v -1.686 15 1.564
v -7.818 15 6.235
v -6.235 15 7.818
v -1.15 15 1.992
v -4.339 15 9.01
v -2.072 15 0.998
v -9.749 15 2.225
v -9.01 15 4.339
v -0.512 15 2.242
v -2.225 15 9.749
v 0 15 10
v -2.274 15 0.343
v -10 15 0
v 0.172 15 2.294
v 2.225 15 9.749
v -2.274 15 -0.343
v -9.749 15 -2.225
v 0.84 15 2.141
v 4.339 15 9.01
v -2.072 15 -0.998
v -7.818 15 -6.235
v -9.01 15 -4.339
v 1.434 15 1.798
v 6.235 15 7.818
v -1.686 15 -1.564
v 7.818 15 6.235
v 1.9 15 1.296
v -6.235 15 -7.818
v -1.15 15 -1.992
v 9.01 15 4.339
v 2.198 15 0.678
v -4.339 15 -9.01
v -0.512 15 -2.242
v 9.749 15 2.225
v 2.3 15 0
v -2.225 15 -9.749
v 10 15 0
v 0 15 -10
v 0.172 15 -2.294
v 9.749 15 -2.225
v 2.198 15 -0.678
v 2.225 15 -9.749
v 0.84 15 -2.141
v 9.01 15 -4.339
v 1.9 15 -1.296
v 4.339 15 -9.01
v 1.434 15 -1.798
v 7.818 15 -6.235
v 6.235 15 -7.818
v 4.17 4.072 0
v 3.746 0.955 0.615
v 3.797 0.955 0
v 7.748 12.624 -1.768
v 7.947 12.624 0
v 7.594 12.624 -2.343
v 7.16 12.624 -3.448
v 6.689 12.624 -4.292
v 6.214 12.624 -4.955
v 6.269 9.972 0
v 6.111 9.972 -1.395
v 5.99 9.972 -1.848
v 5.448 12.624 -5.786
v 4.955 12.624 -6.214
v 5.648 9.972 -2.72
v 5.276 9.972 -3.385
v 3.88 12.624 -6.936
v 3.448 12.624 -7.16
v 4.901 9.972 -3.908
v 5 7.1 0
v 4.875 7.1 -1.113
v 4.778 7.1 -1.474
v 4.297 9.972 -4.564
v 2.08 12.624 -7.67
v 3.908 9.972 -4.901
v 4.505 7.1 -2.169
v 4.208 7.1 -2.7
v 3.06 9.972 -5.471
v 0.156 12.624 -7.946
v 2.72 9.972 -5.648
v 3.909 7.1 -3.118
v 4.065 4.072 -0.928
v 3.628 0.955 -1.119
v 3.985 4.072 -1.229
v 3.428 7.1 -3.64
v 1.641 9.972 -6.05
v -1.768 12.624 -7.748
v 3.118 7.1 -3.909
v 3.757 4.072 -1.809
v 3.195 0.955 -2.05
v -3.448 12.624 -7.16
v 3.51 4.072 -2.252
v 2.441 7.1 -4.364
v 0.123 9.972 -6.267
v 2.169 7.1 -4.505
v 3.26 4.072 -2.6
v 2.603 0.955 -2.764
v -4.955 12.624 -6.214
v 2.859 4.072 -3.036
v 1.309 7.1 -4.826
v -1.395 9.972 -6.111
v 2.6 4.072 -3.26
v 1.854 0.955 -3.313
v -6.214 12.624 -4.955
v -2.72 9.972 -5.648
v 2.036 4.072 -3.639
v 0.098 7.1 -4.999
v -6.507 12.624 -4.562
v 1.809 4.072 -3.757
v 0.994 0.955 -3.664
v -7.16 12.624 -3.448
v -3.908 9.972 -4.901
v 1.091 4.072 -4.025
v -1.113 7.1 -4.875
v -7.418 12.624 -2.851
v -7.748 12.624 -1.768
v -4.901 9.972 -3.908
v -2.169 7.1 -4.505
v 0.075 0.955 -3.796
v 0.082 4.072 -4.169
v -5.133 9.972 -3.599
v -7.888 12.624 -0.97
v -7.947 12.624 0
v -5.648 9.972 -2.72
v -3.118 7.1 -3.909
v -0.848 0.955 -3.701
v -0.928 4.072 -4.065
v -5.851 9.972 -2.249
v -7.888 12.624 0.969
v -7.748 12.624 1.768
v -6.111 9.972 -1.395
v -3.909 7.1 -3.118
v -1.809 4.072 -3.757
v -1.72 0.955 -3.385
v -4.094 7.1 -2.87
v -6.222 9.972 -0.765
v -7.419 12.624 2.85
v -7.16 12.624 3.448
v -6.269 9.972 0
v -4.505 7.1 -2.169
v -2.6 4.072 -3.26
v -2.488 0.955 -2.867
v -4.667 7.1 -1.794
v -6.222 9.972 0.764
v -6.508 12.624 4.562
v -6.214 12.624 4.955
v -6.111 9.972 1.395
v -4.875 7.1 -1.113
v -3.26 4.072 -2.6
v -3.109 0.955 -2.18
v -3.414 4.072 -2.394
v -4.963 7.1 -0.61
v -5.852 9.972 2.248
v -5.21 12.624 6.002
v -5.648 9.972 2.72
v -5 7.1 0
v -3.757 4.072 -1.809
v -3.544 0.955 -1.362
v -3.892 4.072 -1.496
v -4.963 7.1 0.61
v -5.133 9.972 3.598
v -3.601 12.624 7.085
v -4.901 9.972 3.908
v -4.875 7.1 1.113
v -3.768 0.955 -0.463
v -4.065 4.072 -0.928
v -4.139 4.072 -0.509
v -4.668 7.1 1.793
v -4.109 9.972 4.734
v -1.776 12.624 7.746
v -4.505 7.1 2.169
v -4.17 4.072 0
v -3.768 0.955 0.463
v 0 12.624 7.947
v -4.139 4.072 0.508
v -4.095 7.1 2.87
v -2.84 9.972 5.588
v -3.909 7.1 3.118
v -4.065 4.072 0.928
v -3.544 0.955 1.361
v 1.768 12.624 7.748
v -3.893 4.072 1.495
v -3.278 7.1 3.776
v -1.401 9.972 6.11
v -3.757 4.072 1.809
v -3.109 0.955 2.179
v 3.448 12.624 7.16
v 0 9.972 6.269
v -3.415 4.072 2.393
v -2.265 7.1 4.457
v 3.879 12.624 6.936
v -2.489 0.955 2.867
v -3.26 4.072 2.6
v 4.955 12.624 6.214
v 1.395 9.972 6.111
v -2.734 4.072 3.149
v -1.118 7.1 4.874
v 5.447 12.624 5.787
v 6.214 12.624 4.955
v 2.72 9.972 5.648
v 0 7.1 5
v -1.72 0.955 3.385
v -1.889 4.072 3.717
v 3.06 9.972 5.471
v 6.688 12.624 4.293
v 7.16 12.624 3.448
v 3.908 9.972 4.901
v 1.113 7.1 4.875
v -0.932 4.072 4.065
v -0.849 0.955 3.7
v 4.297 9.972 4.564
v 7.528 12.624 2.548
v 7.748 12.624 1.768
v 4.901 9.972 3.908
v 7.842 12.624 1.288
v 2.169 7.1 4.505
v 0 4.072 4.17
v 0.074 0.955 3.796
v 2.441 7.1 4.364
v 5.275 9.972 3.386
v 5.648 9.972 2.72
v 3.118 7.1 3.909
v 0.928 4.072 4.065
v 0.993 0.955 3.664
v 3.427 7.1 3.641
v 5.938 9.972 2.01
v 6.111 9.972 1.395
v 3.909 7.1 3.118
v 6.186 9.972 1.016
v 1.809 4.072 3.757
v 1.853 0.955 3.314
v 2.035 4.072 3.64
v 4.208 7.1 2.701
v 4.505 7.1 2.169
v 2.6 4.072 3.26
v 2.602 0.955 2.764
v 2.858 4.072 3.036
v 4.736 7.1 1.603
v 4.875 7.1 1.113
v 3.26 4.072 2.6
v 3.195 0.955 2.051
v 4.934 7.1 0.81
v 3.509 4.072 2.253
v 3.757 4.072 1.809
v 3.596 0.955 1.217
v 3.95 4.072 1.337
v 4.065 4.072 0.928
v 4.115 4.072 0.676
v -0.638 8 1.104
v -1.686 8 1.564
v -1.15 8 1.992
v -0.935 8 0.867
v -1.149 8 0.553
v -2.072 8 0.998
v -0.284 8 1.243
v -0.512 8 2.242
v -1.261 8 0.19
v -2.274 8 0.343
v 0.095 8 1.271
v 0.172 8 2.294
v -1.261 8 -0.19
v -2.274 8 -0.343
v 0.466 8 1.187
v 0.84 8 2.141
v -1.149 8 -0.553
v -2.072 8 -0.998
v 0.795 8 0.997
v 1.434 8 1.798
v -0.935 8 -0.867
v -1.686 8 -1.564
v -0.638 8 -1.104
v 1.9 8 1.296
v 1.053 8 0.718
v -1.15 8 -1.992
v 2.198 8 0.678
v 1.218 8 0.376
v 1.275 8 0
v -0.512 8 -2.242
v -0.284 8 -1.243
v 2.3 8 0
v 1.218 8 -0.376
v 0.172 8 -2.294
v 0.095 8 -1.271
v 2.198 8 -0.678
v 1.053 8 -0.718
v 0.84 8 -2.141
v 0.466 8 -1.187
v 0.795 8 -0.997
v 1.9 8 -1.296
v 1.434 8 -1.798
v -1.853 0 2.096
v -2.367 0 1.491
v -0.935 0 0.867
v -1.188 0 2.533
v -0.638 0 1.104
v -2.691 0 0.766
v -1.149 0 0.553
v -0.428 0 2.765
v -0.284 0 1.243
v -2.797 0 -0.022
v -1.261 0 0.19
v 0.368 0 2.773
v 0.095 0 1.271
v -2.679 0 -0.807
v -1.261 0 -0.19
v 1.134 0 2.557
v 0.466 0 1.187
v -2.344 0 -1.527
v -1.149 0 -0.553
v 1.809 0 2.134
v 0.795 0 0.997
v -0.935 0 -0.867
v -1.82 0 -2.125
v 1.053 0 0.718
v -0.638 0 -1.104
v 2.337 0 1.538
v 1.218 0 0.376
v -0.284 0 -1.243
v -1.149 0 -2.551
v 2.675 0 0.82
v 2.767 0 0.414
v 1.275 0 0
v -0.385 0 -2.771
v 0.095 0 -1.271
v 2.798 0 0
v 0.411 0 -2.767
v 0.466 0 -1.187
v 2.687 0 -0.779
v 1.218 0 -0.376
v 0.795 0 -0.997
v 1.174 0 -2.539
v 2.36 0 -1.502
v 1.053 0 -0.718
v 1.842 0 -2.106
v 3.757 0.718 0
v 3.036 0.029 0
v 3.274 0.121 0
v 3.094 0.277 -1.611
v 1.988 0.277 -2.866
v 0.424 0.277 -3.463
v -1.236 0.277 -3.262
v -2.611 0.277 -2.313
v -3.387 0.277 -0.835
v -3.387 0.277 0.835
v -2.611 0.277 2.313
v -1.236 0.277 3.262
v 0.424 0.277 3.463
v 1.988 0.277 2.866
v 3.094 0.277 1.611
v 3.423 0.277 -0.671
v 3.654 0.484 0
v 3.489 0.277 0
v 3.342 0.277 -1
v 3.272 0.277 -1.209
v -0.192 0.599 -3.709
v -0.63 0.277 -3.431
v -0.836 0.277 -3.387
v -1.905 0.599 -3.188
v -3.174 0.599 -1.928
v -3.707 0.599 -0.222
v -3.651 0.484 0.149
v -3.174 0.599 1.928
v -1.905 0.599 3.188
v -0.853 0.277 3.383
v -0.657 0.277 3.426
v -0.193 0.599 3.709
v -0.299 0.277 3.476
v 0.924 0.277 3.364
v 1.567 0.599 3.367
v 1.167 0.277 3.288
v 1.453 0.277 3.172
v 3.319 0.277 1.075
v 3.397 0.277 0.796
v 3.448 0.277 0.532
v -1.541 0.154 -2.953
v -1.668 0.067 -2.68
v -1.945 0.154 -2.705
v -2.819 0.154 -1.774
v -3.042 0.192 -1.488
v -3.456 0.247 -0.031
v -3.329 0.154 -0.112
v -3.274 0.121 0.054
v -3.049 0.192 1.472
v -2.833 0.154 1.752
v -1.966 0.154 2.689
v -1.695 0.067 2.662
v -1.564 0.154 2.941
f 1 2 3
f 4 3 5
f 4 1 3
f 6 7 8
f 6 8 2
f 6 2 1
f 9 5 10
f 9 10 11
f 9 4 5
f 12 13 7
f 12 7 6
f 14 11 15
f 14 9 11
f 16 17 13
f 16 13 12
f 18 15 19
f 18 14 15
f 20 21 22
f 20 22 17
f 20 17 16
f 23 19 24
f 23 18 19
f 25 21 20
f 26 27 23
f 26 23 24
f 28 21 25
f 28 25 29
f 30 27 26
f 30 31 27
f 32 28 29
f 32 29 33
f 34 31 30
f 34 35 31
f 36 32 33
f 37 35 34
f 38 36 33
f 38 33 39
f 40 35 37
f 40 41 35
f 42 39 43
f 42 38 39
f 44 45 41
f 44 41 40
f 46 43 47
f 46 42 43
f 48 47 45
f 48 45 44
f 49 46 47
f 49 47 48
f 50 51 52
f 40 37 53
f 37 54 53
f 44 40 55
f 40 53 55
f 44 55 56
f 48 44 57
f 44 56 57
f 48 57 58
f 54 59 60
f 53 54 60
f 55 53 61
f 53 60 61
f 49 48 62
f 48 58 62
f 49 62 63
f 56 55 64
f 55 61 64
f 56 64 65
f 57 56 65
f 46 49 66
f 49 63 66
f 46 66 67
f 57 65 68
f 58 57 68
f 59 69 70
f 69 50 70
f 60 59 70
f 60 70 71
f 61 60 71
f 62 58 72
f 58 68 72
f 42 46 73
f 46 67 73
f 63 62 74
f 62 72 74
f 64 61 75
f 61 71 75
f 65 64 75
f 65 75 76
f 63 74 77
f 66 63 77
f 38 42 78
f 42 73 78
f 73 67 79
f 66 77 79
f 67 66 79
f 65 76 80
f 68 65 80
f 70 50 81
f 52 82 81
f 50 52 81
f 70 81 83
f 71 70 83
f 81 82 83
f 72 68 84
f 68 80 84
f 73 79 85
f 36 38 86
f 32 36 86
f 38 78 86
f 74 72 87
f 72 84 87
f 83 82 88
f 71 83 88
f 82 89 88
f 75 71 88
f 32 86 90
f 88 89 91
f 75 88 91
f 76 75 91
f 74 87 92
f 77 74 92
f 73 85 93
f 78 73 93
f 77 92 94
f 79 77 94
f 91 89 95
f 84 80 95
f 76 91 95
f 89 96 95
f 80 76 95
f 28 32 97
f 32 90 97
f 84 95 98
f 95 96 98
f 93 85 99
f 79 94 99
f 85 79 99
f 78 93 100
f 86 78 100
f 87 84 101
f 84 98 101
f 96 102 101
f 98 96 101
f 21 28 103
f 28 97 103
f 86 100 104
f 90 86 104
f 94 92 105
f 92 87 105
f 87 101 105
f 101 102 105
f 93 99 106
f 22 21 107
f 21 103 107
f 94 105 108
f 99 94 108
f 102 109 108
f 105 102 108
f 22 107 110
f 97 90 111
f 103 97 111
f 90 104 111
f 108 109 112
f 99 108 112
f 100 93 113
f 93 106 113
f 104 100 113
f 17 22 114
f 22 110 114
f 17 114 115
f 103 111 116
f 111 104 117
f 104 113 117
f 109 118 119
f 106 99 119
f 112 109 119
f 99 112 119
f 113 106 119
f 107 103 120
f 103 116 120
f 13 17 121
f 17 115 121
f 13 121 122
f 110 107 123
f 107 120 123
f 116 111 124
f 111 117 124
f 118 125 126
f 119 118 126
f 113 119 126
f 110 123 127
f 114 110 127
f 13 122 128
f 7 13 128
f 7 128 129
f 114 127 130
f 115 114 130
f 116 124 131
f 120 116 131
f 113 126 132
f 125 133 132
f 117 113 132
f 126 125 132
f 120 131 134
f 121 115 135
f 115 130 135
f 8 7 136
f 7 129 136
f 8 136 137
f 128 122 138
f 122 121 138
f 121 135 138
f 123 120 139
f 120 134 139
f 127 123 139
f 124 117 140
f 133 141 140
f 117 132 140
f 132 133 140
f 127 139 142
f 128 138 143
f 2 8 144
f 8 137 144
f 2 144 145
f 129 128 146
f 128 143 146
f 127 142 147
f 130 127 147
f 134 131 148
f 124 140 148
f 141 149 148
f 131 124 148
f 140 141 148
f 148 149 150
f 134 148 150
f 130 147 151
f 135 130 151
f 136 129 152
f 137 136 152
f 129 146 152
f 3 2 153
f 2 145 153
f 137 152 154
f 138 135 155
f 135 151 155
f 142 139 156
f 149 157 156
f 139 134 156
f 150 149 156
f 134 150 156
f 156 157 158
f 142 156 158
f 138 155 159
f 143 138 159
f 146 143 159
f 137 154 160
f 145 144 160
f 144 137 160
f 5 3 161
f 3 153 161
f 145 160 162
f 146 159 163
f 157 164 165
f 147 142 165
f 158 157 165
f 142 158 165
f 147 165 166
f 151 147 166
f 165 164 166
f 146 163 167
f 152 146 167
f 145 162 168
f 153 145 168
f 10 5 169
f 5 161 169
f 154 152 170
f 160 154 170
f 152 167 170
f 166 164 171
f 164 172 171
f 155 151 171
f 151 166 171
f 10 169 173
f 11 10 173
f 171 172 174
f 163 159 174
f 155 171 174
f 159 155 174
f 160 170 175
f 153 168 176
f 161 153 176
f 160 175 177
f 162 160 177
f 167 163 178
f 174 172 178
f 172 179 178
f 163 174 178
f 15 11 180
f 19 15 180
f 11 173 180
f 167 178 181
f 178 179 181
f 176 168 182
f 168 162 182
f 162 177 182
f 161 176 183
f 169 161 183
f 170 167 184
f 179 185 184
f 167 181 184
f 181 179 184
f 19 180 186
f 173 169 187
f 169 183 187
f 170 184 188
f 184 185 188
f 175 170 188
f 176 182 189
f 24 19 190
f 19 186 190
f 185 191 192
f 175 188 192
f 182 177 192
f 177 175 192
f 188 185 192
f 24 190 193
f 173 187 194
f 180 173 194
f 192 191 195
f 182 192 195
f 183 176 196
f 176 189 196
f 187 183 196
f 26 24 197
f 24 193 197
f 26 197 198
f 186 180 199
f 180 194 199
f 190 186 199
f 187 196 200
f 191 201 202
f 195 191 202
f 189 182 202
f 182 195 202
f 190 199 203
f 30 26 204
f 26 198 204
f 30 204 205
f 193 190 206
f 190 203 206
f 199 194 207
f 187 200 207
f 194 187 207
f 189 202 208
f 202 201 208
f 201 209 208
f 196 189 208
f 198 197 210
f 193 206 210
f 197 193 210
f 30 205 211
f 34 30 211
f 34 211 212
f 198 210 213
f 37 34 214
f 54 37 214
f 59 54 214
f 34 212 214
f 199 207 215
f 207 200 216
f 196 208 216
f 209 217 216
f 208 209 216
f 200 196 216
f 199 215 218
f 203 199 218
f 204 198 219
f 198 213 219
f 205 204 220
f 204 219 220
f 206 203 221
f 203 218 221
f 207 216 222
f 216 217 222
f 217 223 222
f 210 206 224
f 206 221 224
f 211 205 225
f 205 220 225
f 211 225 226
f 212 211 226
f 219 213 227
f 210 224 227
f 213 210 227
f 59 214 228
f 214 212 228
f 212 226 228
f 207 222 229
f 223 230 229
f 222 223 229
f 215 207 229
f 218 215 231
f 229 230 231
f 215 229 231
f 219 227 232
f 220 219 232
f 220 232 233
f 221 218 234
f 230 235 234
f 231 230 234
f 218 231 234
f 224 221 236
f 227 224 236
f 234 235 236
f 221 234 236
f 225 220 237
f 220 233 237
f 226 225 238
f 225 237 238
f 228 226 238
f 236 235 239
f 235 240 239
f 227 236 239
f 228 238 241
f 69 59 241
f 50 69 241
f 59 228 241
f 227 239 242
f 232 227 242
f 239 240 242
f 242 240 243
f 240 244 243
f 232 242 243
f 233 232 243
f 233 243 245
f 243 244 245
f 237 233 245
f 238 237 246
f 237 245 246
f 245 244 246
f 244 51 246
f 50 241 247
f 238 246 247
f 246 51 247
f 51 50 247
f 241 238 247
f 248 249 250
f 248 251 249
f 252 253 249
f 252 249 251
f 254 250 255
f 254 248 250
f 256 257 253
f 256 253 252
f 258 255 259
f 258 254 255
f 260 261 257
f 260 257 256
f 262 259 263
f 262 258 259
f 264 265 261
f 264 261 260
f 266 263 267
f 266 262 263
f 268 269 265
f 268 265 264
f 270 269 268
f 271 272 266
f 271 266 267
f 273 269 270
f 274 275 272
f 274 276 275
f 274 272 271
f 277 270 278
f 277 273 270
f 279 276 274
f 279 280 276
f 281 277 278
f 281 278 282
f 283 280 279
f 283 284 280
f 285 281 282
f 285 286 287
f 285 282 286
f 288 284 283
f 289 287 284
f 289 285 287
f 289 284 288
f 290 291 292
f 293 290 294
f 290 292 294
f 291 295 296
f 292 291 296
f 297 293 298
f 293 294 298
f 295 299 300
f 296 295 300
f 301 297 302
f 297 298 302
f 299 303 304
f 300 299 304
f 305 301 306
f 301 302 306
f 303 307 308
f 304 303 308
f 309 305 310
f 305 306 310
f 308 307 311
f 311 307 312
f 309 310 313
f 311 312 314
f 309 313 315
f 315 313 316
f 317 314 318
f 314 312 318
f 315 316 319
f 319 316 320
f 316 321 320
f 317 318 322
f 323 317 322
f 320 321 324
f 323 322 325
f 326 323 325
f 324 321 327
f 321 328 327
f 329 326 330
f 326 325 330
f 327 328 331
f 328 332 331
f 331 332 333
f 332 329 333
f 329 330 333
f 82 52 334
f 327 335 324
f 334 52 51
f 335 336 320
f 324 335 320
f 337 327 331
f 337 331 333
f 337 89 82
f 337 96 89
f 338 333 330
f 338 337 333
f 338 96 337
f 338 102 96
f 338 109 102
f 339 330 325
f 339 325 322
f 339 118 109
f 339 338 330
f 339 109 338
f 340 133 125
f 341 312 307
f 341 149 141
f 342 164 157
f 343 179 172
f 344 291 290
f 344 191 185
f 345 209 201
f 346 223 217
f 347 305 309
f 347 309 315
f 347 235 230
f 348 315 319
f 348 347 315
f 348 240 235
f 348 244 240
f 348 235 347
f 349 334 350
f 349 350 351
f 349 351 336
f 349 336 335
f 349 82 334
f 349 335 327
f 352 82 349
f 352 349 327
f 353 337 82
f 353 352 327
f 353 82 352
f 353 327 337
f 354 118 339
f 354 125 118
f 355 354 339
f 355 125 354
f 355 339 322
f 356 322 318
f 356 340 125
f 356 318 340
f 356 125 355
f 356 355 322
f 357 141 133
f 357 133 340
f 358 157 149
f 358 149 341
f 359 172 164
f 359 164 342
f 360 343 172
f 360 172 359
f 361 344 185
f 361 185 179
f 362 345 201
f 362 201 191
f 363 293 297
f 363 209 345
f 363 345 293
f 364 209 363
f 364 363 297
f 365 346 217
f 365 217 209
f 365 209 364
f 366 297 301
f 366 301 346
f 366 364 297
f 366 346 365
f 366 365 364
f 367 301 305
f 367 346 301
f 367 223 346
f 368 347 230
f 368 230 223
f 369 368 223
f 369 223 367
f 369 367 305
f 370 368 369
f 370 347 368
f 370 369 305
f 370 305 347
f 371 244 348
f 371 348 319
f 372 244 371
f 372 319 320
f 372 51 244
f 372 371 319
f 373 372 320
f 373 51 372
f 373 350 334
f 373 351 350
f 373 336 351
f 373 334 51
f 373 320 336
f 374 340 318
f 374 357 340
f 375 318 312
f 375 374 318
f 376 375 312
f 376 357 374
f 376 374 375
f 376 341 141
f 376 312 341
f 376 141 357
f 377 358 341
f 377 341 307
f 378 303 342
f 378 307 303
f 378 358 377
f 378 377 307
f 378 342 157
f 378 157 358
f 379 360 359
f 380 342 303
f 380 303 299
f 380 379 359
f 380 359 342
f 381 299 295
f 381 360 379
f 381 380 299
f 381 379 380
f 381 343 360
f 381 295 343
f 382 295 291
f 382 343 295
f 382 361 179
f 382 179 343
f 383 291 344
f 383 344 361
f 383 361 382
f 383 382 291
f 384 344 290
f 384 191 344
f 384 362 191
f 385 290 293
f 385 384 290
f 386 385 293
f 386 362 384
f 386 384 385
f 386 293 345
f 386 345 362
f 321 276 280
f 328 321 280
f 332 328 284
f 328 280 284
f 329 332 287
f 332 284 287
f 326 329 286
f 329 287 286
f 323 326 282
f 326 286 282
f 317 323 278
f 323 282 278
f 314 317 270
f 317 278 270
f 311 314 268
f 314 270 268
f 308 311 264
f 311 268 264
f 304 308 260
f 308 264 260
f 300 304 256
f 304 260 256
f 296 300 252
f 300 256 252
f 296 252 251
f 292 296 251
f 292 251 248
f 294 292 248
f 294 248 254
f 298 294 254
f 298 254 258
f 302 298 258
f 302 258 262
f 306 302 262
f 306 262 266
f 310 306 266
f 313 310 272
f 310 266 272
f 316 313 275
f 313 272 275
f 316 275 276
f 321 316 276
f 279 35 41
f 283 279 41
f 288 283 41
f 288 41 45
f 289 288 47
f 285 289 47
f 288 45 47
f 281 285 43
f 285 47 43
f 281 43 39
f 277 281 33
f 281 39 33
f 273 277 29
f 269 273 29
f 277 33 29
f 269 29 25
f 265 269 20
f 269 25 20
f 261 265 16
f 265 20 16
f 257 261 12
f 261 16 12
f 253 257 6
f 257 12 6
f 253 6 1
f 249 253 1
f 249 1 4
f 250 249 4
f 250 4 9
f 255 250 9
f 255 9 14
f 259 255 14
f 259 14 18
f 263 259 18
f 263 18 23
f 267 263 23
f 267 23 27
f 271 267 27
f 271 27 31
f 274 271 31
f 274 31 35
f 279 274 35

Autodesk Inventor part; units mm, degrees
ref_plane "YZ Plane" through (0, 0, 0) normal (1, 0, 0) x (0, 1, 0)
ref_plane "XZ Plane" through (0, 0, 0) normal (0, 1, 0) x (-1, 0, 0)
ref_plane "XY Plane" through (0, 0, 0) normal (0, 0, 1) x (1, 0, 0)
sketch "Sketch1" plane through (0, 0, 0) normal (0, 0, 1) x (1, 0, 0)
  line L0 (0, 0) -> (0, 7.8365) construction
  line L1 (1.275, 0) -> (3.775, 0)
  line L2 (1.275, 0) -> (1.275, 8)
  line L3 (1.275, 8) -> (2.3, 8)
  line L4 (2.3, 8) -> (2.3, 15)
  line L5 (2.3, 15) -> (10, 15)
  arc A0 (10, 15) -> (3.775, 0) centre (24.9598, 0) ccw
  dimension "d0" = 1.275
  dimension "d1" = 15
  dimension "d2" = 8
  dimension "d3" = 2.3
  dimension "d4" = 10
  dimension "d5" = 2.5
revolve "Revolution1" add sketch "Sketch1" angle 360 about axis through (0, 0, 0) along (0, 1, 0)
fillet "Fillet1" radius 1 1 edges at (-3.775, 0, 0)
sketch "Sketch2" plane through (0, 15, 0) normal (0, 1, 0) x (1, 0, 0)
  circle A0 centre (0, 0) radius 2.3 projected
  circle A1 centre (0, 0) radius 10 projected
properties part number "knob_bottom"
